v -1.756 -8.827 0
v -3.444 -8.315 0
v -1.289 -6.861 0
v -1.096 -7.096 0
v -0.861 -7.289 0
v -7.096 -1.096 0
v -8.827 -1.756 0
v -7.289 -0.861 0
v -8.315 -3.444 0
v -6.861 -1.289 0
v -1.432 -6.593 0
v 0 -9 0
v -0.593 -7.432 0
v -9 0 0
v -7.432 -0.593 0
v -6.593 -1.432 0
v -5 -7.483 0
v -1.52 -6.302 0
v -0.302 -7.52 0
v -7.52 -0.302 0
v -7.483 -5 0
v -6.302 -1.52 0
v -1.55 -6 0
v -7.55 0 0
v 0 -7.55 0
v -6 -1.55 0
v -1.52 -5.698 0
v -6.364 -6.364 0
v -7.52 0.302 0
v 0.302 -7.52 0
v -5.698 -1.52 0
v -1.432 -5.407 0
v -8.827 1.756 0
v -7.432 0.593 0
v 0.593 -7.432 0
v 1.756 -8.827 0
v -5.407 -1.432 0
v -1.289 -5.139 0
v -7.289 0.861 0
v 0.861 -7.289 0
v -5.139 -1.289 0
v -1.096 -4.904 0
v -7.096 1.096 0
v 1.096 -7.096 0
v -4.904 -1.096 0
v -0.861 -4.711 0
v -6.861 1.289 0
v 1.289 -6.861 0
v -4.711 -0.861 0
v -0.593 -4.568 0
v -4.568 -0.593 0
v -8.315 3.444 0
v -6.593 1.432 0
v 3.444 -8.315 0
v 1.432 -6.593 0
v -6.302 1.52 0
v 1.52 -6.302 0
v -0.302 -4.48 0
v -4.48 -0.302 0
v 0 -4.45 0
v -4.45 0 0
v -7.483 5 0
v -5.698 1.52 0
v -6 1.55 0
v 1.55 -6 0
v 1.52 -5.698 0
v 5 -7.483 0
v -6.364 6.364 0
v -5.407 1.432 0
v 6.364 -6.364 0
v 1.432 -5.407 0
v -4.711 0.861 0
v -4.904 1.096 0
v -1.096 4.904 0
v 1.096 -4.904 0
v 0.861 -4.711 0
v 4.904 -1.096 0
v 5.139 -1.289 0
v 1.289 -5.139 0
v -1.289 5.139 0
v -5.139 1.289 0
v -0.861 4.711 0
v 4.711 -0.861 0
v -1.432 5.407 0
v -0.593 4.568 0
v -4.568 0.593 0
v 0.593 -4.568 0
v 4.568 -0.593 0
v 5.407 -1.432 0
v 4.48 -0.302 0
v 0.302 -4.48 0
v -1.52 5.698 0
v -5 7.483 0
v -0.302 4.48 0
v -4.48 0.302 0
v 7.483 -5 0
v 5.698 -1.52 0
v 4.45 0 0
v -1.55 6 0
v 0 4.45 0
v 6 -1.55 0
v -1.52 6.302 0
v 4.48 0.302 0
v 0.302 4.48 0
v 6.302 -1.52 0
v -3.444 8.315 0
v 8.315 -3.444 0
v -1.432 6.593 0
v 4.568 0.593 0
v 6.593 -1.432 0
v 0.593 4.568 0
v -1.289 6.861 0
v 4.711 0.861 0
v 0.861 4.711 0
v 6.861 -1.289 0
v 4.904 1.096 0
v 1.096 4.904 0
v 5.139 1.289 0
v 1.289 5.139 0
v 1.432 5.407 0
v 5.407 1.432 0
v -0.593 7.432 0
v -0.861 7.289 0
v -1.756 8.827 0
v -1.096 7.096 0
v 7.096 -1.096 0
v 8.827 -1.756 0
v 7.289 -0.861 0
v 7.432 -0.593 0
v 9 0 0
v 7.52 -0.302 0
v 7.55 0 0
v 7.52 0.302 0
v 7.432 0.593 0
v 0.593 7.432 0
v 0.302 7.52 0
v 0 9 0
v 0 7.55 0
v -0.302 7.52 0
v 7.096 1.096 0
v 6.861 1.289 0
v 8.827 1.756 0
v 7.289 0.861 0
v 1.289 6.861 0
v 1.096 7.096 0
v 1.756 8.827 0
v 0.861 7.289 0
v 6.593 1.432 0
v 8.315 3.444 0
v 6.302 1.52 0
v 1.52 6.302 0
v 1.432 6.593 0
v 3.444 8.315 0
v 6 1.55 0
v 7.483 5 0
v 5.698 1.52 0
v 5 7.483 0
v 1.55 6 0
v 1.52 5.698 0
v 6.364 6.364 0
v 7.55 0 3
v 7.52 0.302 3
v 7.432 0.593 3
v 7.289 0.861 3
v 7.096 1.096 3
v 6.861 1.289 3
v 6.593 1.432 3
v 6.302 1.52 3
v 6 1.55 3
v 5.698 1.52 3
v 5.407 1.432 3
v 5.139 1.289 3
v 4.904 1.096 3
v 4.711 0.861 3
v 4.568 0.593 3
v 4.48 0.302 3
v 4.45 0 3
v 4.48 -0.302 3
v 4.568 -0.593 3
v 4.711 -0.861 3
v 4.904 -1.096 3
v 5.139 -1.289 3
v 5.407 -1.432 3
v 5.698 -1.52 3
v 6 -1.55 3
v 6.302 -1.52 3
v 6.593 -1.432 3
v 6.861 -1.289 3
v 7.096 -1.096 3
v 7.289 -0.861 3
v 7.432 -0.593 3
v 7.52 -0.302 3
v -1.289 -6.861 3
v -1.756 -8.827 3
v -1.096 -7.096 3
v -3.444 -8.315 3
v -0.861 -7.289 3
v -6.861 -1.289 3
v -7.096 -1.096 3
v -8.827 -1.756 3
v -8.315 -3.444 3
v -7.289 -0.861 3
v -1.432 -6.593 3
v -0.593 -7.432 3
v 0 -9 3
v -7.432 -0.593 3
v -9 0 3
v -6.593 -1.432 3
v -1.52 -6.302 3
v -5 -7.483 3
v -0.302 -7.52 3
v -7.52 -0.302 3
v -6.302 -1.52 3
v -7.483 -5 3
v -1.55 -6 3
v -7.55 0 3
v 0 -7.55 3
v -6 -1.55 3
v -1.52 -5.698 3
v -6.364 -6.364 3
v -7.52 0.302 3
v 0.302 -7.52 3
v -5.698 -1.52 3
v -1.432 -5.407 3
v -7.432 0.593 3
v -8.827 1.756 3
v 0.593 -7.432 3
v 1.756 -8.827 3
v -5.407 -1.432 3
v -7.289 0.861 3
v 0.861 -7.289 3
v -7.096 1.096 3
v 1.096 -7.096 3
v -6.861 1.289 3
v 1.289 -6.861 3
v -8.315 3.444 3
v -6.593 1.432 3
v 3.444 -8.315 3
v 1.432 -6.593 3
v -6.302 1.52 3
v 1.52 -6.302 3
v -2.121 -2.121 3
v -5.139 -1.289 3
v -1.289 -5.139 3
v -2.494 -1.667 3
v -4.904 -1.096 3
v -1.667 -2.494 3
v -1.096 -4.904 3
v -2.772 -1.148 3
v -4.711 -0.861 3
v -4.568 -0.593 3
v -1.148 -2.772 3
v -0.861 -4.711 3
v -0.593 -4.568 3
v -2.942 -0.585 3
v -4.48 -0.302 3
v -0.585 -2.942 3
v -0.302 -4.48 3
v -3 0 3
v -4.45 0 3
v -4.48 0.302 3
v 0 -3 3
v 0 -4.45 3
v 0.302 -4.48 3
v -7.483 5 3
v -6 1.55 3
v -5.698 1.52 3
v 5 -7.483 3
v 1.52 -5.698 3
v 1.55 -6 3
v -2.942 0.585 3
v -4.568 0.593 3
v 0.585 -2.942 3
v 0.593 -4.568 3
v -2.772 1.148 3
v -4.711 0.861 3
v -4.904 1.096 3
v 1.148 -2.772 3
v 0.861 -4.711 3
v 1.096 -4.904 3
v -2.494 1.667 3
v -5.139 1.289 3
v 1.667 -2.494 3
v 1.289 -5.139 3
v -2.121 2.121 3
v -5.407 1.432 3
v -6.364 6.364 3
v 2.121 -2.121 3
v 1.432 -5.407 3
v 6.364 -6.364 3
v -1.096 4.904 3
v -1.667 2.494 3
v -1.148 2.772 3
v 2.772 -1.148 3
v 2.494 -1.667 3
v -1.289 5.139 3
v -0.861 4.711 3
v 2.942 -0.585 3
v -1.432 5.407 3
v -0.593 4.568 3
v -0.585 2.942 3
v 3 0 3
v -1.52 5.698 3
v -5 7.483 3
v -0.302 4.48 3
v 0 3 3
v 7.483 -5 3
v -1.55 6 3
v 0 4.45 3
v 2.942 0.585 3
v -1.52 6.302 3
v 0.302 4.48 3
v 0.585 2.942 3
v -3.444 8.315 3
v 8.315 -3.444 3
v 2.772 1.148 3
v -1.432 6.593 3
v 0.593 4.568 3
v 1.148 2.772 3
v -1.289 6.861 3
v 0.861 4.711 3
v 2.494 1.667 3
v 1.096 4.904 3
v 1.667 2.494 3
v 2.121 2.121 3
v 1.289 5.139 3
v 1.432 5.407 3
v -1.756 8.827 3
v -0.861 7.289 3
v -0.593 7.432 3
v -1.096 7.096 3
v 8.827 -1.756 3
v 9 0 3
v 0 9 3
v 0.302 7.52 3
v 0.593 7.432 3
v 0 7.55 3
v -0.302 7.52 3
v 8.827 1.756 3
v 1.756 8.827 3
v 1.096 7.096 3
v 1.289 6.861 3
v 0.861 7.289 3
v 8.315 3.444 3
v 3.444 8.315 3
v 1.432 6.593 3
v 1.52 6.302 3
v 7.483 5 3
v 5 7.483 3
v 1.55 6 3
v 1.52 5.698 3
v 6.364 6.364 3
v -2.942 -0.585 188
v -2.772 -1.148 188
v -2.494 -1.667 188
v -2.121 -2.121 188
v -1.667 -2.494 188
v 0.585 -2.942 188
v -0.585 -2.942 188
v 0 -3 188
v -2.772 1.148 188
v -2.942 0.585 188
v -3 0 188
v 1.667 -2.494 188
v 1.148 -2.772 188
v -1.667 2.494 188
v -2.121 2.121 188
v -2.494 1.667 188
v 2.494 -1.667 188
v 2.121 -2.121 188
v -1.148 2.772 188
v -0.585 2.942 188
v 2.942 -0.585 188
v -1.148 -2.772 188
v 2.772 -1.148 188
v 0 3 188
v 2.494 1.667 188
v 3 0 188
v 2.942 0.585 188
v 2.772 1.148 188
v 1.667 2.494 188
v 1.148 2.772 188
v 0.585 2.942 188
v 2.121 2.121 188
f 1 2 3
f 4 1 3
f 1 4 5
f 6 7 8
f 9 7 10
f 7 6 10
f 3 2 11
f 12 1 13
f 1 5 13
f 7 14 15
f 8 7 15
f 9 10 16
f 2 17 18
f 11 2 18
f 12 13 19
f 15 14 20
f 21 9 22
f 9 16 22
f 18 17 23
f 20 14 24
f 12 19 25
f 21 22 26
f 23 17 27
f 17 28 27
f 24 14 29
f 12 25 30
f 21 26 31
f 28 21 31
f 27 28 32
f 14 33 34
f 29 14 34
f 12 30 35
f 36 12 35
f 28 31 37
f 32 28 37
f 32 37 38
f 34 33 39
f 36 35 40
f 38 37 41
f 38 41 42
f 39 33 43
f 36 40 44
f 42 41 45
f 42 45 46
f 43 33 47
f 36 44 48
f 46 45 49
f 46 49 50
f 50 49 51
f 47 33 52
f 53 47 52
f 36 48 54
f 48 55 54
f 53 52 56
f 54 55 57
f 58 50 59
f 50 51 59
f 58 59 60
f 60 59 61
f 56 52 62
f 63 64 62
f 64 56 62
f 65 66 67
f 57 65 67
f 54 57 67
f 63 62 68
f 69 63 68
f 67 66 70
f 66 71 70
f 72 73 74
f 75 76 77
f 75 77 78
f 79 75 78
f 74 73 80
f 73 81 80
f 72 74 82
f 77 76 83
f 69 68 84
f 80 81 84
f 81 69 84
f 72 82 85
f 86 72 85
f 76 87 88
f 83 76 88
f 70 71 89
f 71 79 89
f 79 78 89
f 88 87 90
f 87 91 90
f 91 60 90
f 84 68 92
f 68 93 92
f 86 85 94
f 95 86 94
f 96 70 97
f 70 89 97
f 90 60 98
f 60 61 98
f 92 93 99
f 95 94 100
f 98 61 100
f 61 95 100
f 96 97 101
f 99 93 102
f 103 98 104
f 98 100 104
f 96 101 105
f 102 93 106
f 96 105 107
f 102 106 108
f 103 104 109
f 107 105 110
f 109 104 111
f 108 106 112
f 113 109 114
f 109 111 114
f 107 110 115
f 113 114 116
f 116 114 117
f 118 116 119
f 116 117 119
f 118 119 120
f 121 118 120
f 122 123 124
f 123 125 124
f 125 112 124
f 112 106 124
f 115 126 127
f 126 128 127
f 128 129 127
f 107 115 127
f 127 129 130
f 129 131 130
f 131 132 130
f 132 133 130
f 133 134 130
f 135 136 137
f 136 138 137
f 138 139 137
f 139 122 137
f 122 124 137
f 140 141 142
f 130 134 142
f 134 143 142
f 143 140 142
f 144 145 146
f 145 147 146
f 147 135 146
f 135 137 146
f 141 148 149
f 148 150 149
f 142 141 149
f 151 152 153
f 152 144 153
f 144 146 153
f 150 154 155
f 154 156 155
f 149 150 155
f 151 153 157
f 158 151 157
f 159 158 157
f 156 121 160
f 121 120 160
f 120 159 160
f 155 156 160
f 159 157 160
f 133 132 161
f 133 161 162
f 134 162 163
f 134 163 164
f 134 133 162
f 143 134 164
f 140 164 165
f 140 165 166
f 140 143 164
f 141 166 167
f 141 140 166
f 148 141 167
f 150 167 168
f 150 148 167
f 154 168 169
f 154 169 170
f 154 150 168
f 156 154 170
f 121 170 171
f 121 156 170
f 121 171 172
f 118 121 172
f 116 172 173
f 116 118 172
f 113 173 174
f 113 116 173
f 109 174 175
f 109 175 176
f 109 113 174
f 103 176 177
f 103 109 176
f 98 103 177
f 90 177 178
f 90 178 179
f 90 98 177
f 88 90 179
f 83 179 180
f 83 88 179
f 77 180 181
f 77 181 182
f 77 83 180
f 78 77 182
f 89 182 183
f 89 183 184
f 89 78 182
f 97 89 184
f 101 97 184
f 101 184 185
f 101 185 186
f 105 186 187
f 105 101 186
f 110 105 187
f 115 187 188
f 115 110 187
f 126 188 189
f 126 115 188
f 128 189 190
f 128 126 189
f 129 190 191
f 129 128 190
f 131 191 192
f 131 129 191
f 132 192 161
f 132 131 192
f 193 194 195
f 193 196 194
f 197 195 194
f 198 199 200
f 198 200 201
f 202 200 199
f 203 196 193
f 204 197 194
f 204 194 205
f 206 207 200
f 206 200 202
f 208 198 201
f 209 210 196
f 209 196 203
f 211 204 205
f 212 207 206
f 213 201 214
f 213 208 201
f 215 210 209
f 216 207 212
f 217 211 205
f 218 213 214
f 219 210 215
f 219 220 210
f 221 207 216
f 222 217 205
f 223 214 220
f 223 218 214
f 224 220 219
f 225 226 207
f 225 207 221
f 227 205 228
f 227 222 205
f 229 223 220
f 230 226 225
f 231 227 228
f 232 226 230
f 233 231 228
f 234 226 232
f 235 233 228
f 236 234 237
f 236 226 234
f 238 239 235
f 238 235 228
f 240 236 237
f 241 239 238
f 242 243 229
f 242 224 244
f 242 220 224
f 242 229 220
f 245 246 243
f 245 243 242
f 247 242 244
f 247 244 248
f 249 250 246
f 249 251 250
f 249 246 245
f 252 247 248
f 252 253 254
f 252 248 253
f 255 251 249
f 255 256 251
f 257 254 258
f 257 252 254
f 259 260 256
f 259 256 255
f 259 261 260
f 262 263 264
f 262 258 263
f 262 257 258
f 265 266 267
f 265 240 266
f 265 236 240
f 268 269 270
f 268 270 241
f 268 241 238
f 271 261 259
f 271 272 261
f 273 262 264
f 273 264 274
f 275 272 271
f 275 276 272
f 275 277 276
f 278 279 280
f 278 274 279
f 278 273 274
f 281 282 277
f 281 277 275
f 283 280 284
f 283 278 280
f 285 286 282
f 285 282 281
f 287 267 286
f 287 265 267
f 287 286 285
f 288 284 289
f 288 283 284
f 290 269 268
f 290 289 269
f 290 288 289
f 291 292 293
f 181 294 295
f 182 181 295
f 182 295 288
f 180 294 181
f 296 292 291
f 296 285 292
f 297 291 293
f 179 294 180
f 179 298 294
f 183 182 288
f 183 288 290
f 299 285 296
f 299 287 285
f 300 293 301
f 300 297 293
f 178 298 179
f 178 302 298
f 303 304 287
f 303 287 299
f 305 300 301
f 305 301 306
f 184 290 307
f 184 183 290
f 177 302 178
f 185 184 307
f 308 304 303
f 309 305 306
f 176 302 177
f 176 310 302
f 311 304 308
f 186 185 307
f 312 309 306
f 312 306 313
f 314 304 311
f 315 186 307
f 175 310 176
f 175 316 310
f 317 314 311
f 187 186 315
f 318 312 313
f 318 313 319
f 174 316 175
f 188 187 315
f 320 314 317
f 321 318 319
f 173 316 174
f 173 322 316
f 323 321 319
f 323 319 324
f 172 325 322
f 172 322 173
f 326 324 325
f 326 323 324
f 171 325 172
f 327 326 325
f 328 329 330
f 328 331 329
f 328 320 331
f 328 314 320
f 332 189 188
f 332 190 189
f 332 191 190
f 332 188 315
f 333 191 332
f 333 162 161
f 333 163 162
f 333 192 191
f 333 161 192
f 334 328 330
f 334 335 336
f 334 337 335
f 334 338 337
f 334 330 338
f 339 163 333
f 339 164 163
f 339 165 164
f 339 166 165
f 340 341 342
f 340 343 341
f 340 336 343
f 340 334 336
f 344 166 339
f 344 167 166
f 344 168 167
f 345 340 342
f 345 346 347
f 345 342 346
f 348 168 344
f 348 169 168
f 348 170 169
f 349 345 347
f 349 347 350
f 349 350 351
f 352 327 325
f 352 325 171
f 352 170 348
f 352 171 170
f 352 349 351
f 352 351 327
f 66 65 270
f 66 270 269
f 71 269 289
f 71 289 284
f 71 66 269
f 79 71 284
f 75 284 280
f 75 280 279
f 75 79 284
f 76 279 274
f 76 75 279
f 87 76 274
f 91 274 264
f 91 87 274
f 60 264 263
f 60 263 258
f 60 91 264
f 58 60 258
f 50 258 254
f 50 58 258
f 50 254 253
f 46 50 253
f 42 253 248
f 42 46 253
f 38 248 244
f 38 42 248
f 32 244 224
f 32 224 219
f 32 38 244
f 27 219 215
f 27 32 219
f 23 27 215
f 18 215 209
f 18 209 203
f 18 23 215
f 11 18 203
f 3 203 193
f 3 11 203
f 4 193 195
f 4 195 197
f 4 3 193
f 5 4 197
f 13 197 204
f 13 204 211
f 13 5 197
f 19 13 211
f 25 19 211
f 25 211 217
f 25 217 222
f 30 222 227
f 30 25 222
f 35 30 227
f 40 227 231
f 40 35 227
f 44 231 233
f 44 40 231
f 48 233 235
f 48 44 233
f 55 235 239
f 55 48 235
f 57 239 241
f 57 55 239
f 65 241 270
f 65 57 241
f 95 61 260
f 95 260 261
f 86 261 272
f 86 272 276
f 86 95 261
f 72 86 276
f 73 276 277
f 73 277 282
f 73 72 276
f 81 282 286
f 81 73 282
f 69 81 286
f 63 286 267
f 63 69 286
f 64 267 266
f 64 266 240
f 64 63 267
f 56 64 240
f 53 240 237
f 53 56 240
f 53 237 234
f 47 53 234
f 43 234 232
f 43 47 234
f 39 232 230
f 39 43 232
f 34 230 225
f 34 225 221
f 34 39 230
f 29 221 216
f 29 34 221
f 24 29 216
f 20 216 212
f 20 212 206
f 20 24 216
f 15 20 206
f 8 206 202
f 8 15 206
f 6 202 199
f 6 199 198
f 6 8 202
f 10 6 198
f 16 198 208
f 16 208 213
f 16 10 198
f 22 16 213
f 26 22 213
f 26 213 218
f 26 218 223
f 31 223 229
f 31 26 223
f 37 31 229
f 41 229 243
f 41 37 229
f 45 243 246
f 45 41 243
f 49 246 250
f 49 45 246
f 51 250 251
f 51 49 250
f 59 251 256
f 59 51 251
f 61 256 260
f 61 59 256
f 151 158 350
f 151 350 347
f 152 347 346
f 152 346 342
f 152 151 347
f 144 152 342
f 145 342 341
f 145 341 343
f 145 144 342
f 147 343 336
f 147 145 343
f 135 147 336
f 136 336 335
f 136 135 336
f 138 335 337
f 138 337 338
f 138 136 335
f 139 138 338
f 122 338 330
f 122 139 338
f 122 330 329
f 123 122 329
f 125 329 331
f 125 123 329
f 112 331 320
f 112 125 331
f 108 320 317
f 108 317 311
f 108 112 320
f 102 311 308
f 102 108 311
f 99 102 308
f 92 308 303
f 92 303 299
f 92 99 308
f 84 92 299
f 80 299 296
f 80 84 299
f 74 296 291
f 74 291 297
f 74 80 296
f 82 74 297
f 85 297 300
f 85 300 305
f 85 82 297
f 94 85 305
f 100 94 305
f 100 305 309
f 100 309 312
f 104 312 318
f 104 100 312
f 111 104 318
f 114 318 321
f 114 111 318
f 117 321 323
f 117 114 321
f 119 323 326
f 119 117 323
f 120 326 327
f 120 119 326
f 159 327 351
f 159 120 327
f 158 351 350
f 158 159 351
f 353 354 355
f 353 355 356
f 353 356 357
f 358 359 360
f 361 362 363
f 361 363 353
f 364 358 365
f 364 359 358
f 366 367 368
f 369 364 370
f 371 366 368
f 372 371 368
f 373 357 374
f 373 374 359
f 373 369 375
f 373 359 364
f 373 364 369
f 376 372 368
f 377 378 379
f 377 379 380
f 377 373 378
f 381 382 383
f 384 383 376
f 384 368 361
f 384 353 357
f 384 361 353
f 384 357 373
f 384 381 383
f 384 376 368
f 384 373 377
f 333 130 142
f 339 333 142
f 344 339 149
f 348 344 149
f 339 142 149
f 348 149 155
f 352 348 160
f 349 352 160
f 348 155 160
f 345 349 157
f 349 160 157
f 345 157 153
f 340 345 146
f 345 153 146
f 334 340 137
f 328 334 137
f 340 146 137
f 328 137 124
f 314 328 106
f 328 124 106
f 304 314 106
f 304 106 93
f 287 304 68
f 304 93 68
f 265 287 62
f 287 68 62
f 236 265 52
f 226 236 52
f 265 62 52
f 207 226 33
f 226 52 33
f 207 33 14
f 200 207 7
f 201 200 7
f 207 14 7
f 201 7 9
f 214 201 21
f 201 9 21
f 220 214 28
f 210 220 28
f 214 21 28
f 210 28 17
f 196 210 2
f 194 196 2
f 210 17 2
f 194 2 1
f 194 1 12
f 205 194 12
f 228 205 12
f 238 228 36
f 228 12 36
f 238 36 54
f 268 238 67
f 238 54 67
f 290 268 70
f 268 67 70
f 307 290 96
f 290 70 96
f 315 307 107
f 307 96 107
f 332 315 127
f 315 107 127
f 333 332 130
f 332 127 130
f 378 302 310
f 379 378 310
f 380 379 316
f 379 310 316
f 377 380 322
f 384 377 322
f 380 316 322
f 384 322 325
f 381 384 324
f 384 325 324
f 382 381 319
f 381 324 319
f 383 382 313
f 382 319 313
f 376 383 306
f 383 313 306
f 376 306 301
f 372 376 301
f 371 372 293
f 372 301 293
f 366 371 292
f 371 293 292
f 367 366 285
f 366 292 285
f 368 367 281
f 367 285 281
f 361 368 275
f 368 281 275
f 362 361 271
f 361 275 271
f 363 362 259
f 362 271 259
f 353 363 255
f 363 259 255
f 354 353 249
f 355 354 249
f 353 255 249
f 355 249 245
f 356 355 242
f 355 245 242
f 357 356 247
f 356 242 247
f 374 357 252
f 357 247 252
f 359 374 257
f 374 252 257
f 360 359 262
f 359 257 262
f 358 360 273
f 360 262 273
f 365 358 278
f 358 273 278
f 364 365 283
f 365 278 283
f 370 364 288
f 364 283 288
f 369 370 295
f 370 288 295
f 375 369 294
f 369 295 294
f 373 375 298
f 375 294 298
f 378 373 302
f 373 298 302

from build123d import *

# Parameters (mm, degrees)
SKETCH1_R           = 9
SKETCH1_R_2         = 1.55
BOSS_EXTRUDE1_DEPTH = 3
SKETCH2_R           = 3
BOSS_EXTRUDE2_DEPTH = 185


with BuildPart() as part:
    # Sketch1 → Boss-Extrude1 (new body)
    with BuildSketch(Plane.XY):
        Circle(SKETCH1_R)
        with Locations((-6, 0)):
            Circle(SKETCH1_R_2, mode=Mode.SUBTRACT)
        with Locations((0, 6)):
            Circle(SKETCH1_R_2, mode=Mode.SUBTRACT)
        with Locations((6, 0)):
            Circle(SKETCH1_R_2, mode=Mode.SUBTRACT)
        with Locations((0, -6)):
            Circle(SKETCH1_R_2, mode=Mode.SUBTRACT)
    extrude(amount=BOSS_EXTRUDE1_DEPTH)

    # Sketch2 → Boss-Extrude2 (add)
    with BuildSketch(Plane.XY.offset(3)):
        Circle(SKETCH2_R)
    extrude(amount=BOSS_EXTRUDE2_DEPTH)


solid = part.part
